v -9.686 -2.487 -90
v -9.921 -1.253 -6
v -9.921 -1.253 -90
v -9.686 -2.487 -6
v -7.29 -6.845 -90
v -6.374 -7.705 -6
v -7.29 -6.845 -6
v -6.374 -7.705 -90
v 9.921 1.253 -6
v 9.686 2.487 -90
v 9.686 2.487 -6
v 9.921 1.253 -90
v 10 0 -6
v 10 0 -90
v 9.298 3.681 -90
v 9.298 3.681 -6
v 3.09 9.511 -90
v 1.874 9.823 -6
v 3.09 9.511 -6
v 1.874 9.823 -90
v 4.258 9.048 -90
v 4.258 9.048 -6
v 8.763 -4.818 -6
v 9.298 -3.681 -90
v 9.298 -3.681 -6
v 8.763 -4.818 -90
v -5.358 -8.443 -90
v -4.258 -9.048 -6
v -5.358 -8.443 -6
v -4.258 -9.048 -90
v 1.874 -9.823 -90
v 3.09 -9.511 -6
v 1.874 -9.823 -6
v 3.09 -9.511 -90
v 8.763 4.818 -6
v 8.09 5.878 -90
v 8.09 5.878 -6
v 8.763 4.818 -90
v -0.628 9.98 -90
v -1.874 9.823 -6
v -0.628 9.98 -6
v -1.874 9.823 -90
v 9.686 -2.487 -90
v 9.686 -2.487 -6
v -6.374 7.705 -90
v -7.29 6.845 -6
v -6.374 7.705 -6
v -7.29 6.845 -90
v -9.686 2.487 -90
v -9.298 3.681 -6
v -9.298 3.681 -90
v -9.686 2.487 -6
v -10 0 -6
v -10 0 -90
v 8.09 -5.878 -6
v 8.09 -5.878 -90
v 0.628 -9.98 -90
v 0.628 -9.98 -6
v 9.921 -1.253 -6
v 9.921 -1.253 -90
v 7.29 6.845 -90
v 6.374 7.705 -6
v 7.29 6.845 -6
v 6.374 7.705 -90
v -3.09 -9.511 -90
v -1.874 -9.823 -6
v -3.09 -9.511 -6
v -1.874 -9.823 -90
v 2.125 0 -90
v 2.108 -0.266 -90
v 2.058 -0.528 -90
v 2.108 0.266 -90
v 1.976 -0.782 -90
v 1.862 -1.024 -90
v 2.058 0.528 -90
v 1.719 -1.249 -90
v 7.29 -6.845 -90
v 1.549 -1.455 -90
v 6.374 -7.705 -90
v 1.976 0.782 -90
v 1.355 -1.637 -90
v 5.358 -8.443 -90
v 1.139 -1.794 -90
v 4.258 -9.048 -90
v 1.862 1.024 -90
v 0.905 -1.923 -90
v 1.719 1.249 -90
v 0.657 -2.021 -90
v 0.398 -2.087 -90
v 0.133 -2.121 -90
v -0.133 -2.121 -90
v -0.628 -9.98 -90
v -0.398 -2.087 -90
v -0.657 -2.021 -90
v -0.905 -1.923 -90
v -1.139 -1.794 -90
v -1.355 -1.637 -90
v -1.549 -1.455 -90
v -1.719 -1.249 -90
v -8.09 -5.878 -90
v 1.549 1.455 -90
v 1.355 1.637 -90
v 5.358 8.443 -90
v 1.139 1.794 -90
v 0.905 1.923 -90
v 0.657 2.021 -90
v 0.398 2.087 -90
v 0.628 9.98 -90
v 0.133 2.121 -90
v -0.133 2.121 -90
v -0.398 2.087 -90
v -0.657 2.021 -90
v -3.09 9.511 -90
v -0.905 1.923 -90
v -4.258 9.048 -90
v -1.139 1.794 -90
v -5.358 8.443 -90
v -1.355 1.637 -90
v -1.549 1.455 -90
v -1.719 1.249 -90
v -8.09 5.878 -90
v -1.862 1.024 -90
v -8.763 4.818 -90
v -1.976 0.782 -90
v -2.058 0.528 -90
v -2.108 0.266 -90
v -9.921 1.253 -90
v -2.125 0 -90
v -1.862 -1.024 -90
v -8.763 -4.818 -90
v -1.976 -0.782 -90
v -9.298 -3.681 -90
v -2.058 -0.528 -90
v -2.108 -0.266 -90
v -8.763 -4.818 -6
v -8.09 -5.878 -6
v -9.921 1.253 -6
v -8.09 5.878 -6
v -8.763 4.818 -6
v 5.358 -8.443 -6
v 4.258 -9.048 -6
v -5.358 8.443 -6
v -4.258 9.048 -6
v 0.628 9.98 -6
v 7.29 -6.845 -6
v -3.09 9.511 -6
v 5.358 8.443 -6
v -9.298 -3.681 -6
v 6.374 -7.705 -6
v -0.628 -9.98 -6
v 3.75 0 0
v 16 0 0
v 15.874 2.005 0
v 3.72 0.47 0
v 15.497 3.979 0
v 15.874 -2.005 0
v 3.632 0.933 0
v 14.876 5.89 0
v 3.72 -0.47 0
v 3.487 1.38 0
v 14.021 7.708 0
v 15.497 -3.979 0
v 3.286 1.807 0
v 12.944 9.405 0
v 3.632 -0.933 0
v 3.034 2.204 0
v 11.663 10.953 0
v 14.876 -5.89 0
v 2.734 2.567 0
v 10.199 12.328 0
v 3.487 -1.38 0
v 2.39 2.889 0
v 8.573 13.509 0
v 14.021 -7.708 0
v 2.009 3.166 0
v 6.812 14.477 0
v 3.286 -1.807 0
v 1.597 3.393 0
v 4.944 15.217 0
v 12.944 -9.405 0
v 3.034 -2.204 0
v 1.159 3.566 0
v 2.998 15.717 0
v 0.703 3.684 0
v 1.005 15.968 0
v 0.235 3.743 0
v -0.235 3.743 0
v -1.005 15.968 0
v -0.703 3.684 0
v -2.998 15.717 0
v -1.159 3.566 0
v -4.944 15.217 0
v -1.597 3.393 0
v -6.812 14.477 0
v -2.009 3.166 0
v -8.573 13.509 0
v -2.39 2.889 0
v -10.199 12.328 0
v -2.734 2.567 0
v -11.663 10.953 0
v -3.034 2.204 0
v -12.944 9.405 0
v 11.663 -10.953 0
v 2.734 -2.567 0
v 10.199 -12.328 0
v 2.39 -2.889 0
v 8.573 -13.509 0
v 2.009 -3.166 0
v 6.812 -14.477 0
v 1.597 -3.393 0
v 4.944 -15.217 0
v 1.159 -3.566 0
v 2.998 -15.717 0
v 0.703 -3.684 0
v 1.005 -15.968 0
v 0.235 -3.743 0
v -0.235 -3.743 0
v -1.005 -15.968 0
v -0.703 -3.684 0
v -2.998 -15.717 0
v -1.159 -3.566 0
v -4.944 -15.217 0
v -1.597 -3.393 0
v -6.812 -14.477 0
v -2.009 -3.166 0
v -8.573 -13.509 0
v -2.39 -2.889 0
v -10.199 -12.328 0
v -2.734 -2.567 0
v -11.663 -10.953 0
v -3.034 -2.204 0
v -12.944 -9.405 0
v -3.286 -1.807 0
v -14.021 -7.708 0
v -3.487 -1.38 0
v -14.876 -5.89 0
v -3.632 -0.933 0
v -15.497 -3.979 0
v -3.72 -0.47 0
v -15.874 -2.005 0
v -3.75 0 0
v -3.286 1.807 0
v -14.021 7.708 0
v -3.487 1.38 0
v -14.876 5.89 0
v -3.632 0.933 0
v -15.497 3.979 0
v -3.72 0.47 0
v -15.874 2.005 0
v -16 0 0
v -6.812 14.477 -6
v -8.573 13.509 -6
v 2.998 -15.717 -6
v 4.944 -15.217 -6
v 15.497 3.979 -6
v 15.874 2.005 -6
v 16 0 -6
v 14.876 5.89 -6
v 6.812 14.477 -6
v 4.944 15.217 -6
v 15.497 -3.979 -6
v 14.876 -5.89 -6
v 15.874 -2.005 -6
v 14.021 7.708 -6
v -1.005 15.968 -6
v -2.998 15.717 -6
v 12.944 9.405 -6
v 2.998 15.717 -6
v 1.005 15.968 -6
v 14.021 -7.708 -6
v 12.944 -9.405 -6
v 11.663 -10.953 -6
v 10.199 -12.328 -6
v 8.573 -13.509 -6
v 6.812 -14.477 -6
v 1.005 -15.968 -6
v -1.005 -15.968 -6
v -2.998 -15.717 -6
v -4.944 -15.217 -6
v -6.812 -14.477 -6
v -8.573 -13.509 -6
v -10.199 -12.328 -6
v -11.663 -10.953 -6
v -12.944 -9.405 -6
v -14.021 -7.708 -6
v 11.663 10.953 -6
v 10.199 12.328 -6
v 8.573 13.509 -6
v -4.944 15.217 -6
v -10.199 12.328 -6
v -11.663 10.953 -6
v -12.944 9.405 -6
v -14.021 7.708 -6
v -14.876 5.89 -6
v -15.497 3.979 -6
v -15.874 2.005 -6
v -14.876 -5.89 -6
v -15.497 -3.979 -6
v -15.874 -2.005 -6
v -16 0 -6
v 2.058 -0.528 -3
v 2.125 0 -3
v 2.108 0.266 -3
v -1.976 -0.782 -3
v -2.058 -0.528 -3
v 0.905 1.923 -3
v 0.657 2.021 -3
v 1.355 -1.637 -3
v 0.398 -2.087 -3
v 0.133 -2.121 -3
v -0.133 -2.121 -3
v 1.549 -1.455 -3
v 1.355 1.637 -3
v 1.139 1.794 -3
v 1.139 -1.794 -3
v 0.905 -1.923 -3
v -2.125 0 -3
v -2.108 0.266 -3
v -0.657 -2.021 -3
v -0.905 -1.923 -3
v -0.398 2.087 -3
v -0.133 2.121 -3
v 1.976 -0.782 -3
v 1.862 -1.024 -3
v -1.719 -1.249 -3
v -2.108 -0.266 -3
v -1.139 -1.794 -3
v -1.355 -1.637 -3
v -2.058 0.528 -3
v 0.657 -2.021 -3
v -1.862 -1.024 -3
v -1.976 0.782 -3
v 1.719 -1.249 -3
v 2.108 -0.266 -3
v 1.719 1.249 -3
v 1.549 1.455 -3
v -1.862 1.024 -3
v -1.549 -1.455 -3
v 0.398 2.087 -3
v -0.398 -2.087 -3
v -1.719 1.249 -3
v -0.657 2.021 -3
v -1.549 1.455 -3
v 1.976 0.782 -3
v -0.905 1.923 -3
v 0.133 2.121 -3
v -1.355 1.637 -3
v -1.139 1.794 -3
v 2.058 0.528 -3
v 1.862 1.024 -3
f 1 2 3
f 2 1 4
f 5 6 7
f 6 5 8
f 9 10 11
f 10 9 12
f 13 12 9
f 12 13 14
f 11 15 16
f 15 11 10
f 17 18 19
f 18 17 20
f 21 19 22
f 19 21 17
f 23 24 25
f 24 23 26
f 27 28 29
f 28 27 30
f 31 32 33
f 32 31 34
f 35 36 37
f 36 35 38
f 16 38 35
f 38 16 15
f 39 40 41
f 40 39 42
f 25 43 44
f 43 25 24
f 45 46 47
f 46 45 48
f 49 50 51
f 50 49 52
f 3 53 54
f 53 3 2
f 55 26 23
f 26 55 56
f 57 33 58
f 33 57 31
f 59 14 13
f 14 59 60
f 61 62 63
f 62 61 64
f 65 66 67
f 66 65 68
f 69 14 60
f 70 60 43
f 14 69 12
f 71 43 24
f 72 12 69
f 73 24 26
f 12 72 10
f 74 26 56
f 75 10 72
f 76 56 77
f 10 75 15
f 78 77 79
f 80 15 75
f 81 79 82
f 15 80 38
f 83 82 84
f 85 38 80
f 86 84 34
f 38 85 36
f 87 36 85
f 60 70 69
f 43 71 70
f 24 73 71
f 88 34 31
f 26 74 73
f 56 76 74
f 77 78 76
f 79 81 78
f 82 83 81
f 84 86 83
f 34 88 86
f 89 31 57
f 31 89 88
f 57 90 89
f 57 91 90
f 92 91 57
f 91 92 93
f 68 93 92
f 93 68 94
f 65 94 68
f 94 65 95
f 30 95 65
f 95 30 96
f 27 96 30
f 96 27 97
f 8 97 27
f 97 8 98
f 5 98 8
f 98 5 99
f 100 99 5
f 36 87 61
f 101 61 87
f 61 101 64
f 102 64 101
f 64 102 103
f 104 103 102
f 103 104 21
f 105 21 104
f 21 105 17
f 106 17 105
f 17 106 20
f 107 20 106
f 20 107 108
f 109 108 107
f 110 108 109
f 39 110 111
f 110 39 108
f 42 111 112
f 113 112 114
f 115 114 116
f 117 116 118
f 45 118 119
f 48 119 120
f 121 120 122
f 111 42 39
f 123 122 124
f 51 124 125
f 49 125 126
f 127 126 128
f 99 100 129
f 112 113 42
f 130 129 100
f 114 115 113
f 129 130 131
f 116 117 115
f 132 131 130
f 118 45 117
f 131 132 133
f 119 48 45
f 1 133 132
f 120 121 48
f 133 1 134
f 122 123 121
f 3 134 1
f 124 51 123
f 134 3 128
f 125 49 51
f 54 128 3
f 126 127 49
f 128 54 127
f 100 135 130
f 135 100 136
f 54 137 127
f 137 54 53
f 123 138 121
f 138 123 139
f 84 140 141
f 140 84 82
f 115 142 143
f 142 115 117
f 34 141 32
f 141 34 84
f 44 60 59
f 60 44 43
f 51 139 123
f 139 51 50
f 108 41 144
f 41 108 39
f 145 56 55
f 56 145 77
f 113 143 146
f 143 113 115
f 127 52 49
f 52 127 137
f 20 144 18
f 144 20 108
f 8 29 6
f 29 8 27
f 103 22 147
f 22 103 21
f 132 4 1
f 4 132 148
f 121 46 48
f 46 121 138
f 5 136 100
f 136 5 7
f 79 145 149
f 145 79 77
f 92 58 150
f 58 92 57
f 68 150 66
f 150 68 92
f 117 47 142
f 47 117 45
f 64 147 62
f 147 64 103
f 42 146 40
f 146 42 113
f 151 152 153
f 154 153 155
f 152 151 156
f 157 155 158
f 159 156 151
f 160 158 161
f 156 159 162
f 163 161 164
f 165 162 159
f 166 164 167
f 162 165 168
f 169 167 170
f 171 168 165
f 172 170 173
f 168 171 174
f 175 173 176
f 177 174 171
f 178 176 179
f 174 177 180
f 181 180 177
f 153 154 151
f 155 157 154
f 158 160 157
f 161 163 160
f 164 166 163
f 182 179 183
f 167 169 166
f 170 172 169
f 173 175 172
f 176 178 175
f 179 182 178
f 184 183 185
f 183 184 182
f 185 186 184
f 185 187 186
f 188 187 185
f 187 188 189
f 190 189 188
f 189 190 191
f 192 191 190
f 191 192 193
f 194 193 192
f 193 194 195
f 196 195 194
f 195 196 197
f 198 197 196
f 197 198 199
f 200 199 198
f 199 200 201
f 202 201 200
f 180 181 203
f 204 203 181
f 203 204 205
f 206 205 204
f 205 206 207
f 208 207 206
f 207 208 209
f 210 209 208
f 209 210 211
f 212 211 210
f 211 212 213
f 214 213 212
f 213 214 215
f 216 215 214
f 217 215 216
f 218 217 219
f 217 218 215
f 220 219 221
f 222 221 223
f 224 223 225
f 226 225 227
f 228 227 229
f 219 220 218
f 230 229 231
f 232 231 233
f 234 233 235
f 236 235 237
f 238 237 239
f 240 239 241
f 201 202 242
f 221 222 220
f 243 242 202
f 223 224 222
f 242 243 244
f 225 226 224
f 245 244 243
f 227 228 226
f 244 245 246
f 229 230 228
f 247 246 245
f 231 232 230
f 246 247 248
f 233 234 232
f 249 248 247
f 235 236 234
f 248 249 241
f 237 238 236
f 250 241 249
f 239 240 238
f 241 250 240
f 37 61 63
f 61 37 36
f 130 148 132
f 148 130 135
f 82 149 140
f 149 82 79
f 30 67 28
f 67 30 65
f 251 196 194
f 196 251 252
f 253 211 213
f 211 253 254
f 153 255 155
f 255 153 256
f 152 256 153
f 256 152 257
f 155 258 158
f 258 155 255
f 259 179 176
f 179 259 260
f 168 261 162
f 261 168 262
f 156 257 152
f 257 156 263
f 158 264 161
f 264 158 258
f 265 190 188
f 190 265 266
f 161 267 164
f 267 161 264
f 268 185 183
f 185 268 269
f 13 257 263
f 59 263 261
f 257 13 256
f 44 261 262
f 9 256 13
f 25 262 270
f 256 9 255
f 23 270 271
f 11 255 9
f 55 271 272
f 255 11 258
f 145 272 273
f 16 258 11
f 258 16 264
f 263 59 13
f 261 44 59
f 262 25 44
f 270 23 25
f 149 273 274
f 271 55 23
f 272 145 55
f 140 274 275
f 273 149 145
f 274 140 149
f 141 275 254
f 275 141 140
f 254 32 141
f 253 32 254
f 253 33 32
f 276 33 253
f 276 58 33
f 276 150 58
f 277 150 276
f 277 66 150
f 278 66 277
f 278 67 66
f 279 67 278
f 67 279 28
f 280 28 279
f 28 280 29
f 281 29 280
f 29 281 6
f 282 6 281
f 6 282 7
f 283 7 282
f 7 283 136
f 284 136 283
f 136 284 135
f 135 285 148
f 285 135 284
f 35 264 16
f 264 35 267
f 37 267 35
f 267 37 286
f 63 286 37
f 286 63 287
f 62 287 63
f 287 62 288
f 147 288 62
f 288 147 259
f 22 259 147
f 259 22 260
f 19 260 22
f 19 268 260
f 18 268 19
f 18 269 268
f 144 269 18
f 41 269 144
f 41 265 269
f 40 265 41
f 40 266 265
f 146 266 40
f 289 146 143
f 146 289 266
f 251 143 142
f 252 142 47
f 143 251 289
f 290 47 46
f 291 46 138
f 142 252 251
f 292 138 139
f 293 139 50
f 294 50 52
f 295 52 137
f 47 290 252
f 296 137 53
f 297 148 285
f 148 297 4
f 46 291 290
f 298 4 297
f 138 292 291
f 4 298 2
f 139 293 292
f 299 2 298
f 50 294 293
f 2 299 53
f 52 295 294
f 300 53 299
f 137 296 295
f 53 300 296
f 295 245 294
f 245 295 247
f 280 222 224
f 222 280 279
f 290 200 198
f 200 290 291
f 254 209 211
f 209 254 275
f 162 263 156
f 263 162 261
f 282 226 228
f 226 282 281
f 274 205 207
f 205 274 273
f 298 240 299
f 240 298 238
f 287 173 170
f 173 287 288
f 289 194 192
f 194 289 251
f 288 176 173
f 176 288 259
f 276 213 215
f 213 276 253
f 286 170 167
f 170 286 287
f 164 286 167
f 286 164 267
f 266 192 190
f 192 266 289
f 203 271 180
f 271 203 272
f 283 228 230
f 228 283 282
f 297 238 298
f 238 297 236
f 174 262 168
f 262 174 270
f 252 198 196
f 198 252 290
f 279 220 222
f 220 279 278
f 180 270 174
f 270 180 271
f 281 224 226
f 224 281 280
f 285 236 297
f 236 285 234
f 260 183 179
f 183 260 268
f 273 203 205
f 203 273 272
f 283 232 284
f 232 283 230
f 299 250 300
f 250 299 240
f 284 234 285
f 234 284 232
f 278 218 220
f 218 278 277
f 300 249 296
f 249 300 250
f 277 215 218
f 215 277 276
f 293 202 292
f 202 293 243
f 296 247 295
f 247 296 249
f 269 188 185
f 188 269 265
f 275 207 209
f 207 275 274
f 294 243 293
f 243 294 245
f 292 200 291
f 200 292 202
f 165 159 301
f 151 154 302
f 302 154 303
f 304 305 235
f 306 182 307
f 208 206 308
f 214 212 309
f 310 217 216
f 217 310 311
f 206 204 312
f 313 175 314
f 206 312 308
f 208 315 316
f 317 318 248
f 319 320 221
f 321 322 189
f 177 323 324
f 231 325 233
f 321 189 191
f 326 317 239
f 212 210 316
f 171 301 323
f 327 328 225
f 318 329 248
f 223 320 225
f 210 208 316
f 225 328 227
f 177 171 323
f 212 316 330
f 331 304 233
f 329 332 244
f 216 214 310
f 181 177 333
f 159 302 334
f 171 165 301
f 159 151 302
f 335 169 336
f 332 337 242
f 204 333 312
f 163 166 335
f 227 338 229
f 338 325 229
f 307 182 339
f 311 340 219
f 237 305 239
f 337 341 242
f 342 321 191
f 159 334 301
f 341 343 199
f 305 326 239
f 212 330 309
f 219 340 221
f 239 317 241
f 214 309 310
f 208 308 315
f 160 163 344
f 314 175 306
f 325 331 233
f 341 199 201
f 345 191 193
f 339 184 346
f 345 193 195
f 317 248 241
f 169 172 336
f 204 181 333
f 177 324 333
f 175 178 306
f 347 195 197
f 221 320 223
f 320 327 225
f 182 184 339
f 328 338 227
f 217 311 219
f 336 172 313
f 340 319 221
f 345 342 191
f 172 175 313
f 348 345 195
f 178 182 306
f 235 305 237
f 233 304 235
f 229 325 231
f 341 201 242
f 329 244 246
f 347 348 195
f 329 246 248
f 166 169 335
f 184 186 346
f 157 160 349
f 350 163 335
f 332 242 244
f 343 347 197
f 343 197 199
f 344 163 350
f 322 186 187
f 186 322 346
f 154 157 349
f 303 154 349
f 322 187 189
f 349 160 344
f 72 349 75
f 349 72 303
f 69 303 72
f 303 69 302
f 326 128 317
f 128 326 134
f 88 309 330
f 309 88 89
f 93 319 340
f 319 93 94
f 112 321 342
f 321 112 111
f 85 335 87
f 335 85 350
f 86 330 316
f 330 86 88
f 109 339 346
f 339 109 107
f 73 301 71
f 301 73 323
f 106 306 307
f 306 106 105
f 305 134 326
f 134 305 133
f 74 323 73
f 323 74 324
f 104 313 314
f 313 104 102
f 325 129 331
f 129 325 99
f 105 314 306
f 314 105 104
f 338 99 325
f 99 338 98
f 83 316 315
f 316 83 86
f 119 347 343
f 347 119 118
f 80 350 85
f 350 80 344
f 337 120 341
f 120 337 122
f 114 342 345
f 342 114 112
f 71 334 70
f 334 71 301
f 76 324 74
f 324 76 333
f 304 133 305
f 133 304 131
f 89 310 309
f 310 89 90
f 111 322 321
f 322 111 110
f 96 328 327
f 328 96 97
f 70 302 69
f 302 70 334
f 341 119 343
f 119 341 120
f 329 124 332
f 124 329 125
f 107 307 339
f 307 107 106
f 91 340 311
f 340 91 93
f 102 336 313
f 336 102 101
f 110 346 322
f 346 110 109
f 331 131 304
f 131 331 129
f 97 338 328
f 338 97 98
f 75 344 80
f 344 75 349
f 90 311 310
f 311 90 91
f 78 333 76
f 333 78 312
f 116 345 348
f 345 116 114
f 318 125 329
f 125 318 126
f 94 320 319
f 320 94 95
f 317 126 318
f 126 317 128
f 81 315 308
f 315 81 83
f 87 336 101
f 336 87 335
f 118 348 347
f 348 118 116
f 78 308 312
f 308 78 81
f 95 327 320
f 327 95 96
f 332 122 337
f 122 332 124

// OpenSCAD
$fn = 50;


difference() {
	union() {
		translate(v = [0, 0, -90.0000000000]) {
			cylinder(h = 90, r = 10.0000000000);
		}
		translate(v = [0, 0, -6.0000000000]) {
			cylinder(h = 6, r = 16.0000000000);
		}
	}
	union() {
		translate(v = [0, 0, 0]) {
			rotate(a = [0, 0, 0]) {
				difference() {
					union() {
						#translate(v = [0, 0, -90.0000000000]) {
							cylinder(h = 90, r = 2.0000000000);
						}
						#translate(v = [0, 0, -3]) {
							cylinder(h = 3, r1 = 2.1250000000, r2 = 3.7500000000);
						}
						#translate(v = [0, 0, -90.0000000000]) {
							cylinder(h = 90, r = 2.1250000000);
						}
						#translate(v = [0, 0, -90.0000000000]) {
							cylinder(h = 90, r = 2.0000000000);
						}
					}
					union();
				}
			}
		}
	}
}
